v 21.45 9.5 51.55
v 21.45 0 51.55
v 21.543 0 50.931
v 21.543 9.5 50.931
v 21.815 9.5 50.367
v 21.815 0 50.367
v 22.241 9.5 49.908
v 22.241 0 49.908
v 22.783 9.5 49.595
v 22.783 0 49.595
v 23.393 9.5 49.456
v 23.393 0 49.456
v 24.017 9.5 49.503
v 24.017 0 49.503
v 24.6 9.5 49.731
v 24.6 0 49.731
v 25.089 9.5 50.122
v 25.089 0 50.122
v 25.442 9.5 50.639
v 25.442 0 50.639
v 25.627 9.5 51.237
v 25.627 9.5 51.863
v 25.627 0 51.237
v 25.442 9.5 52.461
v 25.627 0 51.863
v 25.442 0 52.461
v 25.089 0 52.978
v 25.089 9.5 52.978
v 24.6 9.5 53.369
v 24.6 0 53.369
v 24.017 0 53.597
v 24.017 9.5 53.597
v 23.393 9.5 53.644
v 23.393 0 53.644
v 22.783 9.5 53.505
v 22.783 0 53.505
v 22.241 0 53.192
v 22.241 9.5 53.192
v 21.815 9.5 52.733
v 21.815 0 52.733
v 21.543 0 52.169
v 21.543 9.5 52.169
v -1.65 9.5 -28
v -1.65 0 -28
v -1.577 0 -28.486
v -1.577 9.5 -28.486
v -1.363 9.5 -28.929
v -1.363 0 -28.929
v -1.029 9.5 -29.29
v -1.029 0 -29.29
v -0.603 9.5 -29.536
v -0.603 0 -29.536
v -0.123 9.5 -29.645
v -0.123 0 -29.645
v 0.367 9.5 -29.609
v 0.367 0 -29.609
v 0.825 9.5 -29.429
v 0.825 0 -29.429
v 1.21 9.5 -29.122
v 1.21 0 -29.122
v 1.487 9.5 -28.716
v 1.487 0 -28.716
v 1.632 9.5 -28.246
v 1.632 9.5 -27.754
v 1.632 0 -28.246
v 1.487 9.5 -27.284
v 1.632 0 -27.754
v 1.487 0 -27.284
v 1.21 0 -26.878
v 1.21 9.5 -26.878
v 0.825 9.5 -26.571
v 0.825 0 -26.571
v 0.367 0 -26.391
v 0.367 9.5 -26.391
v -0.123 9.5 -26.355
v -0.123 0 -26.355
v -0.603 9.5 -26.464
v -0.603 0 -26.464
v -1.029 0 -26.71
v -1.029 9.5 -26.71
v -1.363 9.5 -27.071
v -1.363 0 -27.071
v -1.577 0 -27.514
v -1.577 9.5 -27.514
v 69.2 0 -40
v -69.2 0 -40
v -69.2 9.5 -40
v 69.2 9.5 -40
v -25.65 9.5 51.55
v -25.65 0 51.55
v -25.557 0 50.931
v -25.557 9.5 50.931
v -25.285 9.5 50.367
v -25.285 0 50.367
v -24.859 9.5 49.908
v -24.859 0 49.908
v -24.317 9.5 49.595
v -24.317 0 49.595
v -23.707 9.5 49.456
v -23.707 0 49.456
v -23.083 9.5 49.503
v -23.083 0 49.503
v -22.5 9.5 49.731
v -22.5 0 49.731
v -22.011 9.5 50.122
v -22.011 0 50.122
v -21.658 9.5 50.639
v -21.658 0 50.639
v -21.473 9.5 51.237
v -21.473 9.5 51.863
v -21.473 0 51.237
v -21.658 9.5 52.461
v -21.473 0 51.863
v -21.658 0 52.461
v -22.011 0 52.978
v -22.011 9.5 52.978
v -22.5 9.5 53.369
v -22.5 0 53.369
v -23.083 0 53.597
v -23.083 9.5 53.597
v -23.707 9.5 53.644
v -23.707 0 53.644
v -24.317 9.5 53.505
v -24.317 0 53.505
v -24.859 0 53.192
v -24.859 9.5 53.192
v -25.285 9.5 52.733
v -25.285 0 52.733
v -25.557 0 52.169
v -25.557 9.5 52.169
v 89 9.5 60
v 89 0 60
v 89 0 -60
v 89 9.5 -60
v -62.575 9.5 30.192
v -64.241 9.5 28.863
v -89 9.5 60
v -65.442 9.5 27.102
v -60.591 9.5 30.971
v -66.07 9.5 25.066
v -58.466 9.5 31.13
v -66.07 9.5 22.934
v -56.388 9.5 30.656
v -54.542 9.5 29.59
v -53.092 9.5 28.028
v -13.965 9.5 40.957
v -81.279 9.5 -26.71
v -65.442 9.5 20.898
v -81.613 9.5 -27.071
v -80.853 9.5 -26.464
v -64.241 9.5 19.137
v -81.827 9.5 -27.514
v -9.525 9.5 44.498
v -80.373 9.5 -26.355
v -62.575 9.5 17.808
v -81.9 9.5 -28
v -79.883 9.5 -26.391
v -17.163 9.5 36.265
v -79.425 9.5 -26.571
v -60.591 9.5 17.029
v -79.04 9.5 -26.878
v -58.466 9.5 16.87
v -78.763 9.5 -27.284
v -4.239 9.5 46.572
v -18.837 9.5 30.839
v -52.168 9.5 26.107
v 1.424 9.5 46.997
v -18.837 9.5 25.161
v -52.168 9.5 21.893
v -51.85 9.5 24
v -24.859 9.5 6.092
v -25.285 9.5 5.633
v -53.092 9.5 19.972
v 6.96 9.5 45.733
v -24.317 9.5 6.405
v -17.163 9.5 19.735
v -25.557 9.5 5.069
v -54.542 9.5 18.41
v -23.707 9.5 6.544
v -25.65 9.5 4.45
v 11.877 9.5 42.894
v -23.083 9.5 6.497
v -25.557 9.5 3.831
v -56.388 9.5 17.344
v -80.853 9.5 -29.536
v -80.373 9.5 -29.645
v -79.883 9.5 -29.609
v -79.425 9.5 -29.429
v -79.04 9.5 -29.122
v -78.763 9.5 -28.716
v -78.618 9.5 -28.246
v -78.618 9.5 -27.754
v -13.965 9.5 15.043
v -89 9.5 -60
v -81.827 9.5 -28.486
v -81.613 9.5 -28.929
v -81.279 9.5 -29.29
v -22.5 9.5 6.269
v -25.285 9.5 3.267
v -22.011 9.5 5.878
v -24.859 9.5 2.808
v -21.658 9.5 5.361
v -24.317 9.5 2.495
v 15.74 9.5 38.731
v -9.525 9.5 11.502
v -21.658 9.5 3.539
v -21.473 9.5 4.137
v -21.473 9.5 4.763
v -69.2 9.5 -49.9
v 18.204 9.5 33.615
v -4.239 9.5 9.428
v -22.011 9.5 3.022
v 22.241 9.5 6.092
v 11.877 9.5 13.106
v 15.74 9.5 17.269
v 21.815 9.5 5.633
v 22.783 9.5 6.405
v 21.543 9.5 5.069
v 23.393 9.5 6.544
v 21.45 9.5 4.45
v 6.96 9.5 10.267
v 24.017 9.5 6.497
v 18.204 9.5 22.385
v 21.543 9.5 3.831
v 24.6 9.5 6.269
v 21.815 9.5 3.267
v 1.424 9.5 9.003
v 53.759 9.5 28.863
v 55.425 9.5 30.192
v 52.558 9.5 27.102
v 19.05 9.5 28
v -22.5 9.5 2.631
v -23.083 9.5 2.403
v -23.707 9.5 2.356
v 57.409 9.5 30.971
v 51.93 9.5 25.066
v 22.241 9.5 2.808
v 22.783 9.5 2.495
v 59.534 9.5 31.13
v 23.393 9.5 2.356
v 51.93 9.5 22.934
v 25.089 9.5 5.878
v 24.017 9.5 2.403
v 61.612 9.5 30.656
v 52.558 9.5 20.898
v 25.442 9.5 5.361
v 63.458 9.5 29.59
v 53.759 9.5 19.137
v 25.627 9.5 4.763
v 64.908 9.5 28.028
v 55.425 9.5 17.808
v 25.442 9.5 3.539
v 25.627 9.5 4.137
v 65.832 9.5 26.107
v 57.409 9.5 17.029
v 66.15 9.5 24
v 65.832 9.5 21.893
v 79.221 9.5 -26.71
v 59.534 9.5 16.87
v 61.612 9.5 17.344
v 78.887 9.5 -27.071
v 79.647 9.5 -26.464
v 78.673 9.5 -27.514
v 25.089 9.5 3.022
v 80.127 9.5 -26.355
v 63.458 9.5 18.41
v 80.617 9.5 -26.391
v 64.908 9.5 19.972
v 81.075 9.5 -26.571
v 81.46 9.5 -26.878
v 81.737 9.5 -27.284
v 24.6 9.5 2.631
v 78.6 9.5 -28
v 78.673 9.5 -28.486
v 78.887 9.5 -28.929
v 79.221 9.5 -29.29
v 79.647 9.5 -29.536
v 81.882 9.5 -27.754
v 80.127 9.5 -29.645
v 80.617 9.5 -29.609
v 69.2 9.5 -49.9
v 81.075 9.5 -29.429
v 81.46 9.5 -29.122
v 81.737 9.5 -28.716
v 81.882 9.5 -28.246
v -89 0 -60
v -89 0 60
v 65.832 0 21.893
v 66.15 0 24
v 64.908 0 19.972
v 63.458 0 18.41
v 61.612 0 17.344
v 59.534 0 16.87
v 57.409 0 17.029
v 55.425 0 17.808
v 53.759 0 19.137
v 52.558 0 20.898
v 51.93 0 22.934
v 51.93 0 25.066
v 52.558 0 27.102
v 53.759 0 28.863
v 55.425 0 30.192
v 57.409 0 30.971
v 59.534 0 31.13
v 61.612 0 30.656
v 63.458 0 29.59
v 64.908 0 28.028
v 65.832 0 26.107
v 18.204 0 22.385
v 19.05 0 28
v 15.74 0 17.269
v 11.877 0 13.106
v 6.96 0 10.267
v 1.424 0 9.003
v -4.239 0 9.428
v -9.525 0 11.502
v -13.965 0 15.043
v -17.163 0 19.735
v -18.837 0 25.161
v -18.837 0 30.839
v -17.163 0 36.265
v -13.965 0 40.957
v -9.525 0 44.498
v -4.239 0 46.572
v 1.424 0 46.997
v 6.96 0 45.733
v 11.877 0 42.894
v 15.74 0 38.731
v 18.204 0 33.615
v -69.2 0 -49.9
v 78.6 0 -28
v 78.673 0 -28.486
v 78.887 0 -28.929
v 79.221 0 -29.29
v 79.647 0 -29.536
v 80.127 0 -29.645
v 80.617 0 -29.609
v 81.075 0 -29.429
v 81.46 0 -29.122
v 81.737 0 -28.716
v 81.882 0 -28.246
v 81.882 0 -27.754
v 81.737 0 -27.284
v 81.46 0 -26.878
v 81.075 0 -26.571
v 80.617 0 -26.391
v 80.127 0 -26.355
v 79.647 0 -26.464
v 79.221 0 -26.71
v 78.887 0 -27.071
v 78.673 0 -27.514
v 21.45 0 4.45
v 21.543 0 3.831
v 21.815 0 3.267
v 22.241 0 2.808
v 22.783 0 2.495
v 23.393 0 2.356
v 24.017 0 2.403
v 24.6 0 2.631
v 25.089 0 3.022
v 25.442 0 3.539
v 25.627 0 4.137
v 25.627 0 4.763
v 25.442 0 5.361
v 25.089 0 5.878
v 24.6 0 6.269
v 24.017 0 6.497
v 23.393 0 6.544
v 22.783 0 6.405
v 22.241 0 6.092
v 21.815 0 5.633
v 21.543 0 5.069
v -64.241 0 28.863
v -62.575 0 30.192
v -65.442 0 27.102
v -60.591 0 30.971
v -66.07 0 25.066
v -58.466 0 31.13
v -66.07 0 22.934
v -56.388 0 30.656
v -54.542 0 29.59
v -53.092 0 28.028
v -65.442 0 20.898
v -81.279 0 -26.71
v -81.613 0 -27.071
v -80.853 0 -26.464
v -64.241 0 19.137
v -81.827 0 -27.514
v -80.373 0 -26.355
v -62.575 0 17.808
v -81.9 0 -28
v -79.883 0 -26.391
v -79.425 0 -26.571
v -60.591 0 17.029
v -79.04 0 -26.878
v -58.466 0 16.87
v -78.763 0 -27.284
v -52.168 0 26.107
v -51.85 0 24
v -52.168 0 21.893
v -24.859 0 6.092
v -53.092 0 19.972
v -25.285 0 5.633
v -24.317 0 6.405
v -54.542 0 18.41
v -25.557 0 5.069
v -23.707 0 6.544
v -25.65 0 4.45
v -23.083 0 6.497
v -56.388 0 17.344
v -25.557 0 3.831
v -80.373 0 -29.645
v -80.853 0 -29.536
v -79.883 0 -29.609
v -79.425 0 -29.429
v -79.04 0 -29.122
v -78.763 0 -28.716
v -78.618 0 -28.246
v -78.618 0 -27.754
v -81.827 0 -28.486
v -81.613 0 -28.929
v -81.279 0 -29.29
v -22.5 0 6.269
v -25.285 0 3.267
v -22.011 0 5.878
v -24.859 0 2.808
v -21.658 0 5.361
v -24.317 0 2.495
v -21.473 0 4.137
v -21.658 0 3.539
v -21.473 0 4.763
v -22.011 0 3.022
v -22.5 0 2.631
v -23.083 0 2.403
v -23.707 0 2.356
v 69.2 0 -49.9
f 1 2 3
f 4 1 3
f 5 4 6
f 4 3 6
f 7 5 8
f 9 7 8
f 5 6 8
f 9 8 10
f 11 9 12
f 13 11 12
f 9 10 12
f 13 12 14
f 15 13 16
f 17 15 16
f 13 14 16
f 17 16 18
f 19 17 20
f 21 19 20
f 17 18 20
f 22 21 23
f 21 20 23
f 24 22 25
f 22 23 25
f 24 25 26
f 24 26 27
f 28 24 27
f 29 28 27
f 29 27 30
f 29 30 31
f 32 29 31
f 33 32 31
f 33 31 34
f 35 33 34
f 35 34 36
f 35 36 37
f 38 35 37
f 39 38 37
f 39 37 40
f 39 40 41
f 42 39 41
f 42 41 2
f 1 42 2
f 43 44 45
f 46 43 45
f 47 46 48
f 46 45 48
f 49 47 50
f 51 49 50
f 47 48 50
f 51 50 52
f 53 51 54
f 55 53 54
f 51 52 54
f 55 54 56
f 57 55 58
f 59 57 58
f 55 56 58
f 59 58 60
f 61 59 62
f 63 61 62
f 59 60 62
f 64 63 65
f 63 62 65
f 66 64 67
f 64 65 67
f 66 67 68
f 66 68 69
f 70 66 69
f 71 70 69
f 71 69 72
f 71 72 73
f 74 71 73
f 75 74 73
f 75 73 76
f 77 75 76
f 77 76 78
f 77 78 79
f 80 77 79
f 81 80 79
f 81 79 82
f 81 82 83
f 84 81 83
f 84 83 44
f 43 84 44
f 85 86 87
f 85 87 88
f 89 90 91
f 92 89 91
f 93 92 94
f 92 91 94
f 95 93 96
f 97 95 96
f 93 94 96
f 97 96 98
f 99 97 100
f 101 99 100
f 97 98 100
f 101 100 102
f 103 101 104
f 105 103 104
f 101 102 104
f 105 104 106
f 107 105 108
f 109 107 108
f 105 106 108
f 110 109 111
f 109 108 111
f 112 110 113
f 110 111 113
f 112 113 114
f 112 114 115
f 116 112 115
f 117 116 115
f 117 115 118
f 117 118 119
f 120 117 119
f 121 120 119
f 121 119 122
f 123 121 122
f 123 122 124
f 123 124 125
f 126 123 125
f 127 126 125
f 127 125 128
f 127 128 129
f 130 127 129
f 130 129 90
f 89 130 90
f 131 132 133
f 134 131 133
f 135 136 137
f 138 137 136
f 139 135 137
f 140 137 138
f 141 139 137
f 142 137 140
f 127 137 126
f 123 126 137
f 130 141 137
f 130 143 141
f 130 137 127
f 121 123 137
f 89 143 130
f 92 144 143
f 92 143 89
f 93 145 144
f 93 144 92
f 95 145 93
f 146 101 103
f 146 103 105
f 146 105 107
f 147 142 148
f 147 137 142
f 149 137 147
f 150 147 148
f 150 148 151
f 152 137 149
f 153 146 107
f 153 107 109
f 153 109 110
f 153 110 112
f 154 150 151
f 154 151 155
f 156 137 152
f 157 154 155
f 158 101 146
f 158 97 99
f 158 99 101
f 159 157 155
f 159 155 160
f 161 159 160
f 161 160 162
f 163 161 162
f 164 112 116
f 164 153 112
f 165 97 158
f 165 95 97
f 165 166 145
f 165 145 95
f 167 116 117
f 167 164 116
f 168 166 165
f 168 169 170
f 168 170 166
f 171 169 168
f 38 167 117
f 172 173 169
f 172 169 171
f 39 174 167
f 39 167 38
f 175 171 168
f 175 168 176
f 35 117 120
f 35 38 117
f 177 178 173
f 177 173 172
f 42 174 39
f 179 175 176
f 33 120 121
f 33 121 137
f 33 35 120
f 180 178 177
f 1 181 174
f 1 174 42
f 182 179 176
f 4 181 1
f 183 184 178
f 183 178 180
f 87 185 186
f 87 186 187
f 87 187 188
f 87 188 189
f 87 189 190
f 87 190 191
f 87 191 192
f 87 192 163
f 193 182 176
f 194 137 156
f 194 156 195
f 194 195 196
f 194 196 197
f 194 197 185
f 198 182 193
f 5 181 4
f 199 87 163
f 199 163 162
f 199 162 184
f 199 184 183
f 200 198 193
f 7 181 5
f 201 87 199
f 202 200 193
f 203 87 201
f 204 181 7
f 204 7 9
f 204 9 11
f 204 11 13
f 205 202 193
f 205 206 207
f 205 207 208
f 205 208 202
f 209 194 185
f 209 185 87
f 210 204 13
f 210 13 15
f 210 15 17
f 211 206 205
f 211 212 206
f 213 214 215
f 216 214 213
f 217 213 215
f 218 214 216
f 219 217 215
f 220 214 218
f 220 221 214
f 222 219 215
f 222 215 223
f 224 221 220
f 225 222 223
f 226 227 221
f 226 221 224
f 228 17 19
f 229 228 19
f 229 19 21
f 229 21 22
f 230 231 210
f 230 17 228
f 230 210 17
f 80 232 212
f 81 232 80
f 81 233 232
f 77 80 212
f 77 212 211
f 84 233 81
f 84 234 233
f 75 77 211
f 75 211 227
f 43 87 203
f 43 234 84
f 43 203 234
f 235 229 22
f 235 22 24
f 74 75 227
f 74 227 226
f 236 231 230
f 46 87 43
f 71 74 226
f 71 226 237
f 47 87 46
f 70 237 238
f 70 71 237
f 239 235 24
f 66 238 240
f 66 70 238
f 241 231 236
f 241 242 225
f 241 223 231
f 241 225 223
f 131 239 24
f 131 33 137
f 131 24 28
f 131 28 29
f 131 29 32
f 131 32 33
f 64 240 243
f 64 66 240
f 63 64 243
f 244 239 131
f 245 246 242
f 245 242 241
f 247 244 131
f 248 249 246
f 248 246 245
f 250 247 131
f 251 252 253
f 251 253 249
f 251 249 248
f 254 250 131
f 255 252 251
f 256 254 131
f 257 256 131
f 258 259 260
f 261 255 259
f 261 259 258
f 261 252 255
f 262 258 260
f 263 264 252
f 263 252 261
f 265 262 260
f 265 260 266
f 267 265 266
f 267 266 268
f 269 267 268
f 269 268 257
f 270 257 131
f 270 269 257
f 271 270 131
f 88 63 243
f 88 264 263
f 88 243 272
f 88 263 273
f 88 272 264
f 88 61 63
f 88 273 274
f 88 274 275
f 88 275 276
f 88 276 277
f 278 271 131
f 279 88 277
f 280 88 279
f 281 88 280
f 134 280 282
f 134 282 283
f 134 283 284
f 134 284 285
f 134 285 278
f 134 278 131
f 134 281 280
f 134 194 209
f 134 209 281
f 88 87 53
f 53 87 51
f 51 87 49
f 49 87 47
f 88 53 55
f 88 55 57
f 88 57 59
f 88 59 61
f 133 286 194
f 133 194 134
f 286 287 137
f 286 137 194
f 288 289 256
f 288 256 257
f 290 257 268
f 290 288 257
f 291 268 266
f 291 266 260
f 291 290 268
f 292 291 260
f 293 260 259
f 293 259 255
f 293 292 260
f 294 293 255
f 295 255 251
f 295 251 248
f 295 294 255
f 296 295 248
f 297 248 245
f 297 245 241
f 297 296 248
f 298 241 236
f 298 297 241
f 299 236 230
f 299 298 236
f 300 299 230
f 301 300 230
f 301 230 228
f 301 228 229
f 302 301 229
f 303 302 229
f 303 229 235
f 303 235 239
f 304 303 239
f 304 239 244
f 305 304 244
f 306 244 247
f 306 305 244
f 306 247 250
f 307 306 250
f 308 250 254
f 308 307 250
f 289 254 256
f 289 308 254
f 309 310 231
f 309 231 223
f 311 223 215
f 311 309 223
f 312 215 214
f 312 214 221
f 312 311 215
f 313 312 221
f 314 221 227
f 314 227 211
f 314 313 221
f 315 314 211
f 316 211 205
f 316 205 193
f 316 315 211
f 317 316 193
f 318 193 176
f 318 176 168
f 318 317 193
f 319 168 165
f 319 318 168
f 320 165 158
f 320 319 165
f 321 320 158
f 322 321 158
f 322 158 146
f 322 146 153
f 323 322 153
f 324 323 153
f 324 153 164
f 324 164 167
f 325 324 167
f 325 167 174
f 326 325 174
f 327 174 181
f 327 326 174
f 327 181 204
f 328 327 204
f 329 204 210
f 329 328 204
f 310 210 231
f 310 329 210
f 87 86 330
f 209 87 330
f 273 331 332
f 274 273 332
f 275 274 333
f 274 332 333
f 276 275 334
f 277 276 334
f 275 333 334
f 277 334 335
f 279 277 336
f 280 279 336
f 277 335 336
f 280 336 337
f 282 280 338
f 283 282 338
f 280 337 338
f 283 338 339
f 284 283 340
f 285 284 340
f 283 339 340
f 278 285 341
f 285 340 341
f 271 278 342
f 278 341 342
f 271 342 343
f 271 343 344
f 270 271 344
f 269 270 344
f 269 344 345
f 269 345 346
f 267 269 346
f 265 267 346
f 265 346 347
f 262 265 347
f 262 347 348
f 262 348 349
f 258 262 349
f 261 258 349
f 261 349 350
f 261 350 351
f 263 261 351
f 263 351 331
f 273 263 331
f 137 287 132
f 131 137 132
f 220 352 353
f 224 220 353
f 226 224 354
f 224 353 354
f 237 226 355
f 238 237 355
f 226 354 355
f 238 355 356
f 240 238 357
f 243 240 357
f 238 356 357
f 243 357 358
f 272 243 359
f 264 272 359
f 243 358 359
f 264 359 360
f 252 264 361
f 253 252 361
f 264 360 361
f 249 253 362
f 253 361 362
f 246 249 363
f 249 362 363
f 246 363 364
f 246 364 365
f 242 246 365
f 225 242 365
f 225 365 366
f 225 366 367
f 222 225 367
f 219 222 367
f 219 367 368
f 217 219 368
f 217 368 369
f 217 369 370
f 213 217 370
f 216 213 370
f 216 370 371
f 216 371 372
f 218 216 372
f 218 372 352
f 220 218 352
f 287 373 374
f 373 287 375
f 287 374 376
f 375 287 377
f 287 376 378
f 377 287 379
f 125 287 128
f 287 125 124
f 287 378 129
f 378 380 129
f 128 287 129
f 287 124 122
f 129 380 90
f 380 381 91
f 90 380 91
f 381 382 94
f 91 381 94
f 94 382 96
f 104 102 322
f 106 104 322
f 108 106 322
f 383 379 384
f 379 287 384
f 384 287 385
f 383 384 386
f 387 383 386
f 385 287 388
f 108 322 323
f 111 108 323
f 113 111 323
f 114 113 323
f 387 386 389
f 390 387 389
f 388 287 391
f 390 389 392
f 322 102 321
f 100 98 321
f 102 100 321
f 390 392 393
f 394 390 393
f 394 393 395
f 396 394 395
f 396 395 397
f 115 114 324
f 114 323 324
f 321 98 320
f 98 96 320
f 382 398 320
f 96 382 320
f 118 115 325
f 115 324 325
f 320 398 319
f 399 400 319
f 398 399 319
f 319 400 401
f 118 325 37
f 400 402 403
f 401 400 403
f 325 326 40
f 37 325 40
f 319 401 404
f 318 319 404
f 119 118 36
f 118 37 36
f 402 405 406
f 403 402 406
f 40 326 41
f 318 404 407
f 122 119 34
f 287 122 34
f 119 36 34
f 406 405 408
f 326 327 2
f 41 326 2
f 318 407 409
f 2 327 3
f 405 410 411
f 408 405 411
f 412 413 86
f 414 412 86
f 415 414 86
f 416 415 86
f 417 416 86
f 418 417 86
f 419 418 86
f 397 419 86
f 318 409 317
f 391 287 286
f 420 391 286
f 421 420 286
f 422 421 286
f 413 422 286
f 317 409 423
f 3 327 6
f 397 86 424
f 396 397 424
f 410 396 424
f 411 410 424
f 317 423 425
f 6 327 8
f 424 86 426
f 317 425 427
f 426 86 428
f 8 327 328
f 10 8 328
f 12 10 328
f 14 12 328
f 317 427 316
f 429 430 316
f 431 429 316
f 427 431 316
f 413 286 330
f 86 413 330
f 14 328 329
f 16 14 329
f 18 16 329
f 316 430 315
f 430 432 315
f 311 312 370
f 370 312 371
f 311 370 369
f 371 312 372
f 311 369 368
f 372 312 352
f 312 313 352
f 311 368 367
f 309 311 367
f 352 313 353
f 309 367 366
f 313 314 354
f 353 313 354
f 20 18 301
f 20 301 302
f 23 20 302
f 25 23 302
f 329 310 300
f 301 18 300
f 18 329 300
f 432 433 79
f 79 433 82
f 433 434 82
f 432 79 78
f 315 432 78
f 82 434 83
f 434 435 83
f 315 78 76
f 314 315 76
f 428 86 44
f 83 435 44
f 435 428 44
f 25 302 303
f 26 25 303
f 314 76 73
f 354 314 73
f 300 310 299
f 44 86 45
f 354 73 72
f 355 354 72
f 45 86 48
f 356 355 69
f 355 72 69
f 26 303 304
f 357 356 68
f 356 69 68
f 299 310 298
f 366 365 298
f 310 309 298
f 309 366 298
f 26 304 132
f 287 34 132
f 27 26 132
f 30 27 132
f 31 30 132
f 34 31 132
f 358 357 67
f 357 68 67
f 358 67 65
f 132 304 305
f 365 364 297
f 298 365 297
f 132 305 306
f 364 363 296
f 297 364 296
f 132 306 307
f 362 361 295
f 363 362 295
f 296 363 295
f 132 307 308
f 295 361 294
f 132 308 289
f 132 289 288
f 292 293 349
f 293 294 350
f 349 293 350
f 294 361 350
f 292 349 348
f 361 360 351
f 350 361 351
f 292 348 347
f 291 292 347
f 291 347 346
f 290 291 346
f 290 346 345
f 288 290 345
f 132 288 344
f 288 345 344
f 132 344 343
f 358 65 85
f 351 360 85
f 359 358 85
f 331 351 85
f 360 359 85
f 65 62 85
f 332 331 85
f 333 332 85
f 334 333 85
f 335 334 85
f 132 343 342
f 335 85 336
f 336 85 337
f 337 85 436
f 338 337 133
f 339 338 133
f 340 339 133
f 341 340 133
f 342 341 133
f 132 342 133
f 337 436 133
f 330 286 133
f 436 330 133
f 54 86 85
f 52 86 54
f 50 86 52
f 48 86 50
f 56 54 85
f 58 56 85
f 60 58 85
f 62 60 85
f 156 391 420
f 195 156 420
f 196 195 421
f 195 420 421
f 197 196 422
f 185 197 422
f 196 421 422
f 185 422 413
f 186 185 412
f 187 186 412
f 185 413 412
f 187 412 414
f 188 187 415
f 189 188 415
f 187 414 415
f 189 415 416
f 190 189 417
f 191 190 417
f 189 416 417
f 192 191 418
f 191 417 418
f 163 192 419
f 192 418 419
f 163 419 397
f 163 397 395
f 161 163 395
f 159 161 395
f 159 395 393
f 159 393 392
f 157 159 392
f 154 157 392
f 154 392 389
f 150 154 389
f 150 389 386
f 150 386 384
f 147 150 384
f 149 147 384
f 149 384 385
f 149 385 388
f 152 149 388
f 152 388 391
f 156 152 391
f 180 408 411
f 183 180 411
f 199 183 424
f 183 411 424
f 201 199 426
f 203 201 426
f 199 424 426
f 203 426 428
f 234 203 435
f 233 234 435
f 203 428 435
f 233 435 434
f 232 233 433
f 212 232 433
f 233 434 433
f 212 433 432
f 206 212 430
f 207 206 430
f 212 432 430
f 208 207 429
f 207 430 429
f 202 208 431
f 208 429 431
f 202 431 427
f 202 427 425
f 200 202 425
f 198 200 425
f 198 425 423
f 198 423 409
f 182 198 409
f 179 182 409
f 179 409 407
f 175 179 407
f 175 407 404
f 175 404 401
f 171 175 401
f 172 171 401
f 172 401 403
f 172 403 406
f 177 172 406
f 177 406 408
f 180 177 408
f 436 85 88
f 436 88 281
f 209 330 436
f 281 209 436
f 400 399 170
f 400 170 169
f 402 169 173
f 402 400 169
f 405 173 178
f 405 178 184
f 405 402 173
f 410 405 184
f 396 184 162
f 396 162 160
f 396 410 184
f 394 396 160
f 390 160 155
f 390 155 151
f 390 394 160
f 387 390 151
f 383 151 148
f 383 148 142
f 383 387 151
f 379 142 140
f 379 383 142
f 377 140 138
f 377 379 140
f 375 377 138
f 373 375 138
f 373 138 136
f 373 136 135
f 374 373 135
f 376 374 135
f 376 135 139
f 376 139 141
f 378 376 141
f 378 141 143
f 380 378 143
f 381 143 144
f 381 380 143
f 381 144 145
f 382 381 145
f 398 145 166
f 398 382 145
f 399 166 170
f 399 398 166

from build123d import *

# Parameters (mm, degrees)
SKETCH1_W           = 178
SKETCH1_H           = 120
SKETCH1_R           = 19.05
SKETCH1_R_2         = 7.15
SKETCH1_W_2         = 138.4
SKETCH1_H_2         = 9.9
BOSS_EXTRUDE1_DEPTH = 9.5
M4_TAPPED_HOLE1_D   = 3.3
M5_TAPPED_HOLE1_D   = 4.2


with BuildPart() as part:
    # Sketch1 → Boss-Extrude1 (new body)
    with BuildSketch(Plane(origin=(0, 0, 0), x_dir=(1, 0, 0), z_dir=(0, 1, 0))):
        Rectangle(SKETCH1_W, SKETCH1_H)
        with Locations((0, -28)):
            Circle(SKETCH1_R, mode=Mode.SUBTRACT)
        with Locations((-59, -24)):
            Circle(SKETCH1_R_2, mode=Mode.SUBTRACT)
        with Locations((59, -24)):
            Circle(SKETCH1_R_2, mode=Mode.SUBTRACT)
        with Locations((0, 44.95)):
            Rectangle(SKETCH1_W_2, SKETCH1_H_2, mode=Mode.SUBTRACT)
    extrude(amount=BOSS_EXTRUDE1_DEPTH)

    # M4 Tapped Hole1 (through all)
    with Locations(Plane(origin=(0, 9.5, 0), x_dir=(1, 0, 0), z_dir=(0, 1, 0))):
        with Locations((-80.25, 28), (0, 28), (80.25, 28)):
            Hole(M4_TAPPED_HOLE1_D / 2)

    # M5 Tapped Hole1 (through all)
    with Locations(Plane(origin=(0, 9.5, 0), x_dir=(1, 0, 0), z_dir=(0, 1, 0))):
        with Locations((-23.55, -4.45), (23.55, -4.45), (23.55, -51.55), (-23.55, -51.55)):
            Hole(M5_TAPPED_HOLE1_D / 2)


solid = part.part
